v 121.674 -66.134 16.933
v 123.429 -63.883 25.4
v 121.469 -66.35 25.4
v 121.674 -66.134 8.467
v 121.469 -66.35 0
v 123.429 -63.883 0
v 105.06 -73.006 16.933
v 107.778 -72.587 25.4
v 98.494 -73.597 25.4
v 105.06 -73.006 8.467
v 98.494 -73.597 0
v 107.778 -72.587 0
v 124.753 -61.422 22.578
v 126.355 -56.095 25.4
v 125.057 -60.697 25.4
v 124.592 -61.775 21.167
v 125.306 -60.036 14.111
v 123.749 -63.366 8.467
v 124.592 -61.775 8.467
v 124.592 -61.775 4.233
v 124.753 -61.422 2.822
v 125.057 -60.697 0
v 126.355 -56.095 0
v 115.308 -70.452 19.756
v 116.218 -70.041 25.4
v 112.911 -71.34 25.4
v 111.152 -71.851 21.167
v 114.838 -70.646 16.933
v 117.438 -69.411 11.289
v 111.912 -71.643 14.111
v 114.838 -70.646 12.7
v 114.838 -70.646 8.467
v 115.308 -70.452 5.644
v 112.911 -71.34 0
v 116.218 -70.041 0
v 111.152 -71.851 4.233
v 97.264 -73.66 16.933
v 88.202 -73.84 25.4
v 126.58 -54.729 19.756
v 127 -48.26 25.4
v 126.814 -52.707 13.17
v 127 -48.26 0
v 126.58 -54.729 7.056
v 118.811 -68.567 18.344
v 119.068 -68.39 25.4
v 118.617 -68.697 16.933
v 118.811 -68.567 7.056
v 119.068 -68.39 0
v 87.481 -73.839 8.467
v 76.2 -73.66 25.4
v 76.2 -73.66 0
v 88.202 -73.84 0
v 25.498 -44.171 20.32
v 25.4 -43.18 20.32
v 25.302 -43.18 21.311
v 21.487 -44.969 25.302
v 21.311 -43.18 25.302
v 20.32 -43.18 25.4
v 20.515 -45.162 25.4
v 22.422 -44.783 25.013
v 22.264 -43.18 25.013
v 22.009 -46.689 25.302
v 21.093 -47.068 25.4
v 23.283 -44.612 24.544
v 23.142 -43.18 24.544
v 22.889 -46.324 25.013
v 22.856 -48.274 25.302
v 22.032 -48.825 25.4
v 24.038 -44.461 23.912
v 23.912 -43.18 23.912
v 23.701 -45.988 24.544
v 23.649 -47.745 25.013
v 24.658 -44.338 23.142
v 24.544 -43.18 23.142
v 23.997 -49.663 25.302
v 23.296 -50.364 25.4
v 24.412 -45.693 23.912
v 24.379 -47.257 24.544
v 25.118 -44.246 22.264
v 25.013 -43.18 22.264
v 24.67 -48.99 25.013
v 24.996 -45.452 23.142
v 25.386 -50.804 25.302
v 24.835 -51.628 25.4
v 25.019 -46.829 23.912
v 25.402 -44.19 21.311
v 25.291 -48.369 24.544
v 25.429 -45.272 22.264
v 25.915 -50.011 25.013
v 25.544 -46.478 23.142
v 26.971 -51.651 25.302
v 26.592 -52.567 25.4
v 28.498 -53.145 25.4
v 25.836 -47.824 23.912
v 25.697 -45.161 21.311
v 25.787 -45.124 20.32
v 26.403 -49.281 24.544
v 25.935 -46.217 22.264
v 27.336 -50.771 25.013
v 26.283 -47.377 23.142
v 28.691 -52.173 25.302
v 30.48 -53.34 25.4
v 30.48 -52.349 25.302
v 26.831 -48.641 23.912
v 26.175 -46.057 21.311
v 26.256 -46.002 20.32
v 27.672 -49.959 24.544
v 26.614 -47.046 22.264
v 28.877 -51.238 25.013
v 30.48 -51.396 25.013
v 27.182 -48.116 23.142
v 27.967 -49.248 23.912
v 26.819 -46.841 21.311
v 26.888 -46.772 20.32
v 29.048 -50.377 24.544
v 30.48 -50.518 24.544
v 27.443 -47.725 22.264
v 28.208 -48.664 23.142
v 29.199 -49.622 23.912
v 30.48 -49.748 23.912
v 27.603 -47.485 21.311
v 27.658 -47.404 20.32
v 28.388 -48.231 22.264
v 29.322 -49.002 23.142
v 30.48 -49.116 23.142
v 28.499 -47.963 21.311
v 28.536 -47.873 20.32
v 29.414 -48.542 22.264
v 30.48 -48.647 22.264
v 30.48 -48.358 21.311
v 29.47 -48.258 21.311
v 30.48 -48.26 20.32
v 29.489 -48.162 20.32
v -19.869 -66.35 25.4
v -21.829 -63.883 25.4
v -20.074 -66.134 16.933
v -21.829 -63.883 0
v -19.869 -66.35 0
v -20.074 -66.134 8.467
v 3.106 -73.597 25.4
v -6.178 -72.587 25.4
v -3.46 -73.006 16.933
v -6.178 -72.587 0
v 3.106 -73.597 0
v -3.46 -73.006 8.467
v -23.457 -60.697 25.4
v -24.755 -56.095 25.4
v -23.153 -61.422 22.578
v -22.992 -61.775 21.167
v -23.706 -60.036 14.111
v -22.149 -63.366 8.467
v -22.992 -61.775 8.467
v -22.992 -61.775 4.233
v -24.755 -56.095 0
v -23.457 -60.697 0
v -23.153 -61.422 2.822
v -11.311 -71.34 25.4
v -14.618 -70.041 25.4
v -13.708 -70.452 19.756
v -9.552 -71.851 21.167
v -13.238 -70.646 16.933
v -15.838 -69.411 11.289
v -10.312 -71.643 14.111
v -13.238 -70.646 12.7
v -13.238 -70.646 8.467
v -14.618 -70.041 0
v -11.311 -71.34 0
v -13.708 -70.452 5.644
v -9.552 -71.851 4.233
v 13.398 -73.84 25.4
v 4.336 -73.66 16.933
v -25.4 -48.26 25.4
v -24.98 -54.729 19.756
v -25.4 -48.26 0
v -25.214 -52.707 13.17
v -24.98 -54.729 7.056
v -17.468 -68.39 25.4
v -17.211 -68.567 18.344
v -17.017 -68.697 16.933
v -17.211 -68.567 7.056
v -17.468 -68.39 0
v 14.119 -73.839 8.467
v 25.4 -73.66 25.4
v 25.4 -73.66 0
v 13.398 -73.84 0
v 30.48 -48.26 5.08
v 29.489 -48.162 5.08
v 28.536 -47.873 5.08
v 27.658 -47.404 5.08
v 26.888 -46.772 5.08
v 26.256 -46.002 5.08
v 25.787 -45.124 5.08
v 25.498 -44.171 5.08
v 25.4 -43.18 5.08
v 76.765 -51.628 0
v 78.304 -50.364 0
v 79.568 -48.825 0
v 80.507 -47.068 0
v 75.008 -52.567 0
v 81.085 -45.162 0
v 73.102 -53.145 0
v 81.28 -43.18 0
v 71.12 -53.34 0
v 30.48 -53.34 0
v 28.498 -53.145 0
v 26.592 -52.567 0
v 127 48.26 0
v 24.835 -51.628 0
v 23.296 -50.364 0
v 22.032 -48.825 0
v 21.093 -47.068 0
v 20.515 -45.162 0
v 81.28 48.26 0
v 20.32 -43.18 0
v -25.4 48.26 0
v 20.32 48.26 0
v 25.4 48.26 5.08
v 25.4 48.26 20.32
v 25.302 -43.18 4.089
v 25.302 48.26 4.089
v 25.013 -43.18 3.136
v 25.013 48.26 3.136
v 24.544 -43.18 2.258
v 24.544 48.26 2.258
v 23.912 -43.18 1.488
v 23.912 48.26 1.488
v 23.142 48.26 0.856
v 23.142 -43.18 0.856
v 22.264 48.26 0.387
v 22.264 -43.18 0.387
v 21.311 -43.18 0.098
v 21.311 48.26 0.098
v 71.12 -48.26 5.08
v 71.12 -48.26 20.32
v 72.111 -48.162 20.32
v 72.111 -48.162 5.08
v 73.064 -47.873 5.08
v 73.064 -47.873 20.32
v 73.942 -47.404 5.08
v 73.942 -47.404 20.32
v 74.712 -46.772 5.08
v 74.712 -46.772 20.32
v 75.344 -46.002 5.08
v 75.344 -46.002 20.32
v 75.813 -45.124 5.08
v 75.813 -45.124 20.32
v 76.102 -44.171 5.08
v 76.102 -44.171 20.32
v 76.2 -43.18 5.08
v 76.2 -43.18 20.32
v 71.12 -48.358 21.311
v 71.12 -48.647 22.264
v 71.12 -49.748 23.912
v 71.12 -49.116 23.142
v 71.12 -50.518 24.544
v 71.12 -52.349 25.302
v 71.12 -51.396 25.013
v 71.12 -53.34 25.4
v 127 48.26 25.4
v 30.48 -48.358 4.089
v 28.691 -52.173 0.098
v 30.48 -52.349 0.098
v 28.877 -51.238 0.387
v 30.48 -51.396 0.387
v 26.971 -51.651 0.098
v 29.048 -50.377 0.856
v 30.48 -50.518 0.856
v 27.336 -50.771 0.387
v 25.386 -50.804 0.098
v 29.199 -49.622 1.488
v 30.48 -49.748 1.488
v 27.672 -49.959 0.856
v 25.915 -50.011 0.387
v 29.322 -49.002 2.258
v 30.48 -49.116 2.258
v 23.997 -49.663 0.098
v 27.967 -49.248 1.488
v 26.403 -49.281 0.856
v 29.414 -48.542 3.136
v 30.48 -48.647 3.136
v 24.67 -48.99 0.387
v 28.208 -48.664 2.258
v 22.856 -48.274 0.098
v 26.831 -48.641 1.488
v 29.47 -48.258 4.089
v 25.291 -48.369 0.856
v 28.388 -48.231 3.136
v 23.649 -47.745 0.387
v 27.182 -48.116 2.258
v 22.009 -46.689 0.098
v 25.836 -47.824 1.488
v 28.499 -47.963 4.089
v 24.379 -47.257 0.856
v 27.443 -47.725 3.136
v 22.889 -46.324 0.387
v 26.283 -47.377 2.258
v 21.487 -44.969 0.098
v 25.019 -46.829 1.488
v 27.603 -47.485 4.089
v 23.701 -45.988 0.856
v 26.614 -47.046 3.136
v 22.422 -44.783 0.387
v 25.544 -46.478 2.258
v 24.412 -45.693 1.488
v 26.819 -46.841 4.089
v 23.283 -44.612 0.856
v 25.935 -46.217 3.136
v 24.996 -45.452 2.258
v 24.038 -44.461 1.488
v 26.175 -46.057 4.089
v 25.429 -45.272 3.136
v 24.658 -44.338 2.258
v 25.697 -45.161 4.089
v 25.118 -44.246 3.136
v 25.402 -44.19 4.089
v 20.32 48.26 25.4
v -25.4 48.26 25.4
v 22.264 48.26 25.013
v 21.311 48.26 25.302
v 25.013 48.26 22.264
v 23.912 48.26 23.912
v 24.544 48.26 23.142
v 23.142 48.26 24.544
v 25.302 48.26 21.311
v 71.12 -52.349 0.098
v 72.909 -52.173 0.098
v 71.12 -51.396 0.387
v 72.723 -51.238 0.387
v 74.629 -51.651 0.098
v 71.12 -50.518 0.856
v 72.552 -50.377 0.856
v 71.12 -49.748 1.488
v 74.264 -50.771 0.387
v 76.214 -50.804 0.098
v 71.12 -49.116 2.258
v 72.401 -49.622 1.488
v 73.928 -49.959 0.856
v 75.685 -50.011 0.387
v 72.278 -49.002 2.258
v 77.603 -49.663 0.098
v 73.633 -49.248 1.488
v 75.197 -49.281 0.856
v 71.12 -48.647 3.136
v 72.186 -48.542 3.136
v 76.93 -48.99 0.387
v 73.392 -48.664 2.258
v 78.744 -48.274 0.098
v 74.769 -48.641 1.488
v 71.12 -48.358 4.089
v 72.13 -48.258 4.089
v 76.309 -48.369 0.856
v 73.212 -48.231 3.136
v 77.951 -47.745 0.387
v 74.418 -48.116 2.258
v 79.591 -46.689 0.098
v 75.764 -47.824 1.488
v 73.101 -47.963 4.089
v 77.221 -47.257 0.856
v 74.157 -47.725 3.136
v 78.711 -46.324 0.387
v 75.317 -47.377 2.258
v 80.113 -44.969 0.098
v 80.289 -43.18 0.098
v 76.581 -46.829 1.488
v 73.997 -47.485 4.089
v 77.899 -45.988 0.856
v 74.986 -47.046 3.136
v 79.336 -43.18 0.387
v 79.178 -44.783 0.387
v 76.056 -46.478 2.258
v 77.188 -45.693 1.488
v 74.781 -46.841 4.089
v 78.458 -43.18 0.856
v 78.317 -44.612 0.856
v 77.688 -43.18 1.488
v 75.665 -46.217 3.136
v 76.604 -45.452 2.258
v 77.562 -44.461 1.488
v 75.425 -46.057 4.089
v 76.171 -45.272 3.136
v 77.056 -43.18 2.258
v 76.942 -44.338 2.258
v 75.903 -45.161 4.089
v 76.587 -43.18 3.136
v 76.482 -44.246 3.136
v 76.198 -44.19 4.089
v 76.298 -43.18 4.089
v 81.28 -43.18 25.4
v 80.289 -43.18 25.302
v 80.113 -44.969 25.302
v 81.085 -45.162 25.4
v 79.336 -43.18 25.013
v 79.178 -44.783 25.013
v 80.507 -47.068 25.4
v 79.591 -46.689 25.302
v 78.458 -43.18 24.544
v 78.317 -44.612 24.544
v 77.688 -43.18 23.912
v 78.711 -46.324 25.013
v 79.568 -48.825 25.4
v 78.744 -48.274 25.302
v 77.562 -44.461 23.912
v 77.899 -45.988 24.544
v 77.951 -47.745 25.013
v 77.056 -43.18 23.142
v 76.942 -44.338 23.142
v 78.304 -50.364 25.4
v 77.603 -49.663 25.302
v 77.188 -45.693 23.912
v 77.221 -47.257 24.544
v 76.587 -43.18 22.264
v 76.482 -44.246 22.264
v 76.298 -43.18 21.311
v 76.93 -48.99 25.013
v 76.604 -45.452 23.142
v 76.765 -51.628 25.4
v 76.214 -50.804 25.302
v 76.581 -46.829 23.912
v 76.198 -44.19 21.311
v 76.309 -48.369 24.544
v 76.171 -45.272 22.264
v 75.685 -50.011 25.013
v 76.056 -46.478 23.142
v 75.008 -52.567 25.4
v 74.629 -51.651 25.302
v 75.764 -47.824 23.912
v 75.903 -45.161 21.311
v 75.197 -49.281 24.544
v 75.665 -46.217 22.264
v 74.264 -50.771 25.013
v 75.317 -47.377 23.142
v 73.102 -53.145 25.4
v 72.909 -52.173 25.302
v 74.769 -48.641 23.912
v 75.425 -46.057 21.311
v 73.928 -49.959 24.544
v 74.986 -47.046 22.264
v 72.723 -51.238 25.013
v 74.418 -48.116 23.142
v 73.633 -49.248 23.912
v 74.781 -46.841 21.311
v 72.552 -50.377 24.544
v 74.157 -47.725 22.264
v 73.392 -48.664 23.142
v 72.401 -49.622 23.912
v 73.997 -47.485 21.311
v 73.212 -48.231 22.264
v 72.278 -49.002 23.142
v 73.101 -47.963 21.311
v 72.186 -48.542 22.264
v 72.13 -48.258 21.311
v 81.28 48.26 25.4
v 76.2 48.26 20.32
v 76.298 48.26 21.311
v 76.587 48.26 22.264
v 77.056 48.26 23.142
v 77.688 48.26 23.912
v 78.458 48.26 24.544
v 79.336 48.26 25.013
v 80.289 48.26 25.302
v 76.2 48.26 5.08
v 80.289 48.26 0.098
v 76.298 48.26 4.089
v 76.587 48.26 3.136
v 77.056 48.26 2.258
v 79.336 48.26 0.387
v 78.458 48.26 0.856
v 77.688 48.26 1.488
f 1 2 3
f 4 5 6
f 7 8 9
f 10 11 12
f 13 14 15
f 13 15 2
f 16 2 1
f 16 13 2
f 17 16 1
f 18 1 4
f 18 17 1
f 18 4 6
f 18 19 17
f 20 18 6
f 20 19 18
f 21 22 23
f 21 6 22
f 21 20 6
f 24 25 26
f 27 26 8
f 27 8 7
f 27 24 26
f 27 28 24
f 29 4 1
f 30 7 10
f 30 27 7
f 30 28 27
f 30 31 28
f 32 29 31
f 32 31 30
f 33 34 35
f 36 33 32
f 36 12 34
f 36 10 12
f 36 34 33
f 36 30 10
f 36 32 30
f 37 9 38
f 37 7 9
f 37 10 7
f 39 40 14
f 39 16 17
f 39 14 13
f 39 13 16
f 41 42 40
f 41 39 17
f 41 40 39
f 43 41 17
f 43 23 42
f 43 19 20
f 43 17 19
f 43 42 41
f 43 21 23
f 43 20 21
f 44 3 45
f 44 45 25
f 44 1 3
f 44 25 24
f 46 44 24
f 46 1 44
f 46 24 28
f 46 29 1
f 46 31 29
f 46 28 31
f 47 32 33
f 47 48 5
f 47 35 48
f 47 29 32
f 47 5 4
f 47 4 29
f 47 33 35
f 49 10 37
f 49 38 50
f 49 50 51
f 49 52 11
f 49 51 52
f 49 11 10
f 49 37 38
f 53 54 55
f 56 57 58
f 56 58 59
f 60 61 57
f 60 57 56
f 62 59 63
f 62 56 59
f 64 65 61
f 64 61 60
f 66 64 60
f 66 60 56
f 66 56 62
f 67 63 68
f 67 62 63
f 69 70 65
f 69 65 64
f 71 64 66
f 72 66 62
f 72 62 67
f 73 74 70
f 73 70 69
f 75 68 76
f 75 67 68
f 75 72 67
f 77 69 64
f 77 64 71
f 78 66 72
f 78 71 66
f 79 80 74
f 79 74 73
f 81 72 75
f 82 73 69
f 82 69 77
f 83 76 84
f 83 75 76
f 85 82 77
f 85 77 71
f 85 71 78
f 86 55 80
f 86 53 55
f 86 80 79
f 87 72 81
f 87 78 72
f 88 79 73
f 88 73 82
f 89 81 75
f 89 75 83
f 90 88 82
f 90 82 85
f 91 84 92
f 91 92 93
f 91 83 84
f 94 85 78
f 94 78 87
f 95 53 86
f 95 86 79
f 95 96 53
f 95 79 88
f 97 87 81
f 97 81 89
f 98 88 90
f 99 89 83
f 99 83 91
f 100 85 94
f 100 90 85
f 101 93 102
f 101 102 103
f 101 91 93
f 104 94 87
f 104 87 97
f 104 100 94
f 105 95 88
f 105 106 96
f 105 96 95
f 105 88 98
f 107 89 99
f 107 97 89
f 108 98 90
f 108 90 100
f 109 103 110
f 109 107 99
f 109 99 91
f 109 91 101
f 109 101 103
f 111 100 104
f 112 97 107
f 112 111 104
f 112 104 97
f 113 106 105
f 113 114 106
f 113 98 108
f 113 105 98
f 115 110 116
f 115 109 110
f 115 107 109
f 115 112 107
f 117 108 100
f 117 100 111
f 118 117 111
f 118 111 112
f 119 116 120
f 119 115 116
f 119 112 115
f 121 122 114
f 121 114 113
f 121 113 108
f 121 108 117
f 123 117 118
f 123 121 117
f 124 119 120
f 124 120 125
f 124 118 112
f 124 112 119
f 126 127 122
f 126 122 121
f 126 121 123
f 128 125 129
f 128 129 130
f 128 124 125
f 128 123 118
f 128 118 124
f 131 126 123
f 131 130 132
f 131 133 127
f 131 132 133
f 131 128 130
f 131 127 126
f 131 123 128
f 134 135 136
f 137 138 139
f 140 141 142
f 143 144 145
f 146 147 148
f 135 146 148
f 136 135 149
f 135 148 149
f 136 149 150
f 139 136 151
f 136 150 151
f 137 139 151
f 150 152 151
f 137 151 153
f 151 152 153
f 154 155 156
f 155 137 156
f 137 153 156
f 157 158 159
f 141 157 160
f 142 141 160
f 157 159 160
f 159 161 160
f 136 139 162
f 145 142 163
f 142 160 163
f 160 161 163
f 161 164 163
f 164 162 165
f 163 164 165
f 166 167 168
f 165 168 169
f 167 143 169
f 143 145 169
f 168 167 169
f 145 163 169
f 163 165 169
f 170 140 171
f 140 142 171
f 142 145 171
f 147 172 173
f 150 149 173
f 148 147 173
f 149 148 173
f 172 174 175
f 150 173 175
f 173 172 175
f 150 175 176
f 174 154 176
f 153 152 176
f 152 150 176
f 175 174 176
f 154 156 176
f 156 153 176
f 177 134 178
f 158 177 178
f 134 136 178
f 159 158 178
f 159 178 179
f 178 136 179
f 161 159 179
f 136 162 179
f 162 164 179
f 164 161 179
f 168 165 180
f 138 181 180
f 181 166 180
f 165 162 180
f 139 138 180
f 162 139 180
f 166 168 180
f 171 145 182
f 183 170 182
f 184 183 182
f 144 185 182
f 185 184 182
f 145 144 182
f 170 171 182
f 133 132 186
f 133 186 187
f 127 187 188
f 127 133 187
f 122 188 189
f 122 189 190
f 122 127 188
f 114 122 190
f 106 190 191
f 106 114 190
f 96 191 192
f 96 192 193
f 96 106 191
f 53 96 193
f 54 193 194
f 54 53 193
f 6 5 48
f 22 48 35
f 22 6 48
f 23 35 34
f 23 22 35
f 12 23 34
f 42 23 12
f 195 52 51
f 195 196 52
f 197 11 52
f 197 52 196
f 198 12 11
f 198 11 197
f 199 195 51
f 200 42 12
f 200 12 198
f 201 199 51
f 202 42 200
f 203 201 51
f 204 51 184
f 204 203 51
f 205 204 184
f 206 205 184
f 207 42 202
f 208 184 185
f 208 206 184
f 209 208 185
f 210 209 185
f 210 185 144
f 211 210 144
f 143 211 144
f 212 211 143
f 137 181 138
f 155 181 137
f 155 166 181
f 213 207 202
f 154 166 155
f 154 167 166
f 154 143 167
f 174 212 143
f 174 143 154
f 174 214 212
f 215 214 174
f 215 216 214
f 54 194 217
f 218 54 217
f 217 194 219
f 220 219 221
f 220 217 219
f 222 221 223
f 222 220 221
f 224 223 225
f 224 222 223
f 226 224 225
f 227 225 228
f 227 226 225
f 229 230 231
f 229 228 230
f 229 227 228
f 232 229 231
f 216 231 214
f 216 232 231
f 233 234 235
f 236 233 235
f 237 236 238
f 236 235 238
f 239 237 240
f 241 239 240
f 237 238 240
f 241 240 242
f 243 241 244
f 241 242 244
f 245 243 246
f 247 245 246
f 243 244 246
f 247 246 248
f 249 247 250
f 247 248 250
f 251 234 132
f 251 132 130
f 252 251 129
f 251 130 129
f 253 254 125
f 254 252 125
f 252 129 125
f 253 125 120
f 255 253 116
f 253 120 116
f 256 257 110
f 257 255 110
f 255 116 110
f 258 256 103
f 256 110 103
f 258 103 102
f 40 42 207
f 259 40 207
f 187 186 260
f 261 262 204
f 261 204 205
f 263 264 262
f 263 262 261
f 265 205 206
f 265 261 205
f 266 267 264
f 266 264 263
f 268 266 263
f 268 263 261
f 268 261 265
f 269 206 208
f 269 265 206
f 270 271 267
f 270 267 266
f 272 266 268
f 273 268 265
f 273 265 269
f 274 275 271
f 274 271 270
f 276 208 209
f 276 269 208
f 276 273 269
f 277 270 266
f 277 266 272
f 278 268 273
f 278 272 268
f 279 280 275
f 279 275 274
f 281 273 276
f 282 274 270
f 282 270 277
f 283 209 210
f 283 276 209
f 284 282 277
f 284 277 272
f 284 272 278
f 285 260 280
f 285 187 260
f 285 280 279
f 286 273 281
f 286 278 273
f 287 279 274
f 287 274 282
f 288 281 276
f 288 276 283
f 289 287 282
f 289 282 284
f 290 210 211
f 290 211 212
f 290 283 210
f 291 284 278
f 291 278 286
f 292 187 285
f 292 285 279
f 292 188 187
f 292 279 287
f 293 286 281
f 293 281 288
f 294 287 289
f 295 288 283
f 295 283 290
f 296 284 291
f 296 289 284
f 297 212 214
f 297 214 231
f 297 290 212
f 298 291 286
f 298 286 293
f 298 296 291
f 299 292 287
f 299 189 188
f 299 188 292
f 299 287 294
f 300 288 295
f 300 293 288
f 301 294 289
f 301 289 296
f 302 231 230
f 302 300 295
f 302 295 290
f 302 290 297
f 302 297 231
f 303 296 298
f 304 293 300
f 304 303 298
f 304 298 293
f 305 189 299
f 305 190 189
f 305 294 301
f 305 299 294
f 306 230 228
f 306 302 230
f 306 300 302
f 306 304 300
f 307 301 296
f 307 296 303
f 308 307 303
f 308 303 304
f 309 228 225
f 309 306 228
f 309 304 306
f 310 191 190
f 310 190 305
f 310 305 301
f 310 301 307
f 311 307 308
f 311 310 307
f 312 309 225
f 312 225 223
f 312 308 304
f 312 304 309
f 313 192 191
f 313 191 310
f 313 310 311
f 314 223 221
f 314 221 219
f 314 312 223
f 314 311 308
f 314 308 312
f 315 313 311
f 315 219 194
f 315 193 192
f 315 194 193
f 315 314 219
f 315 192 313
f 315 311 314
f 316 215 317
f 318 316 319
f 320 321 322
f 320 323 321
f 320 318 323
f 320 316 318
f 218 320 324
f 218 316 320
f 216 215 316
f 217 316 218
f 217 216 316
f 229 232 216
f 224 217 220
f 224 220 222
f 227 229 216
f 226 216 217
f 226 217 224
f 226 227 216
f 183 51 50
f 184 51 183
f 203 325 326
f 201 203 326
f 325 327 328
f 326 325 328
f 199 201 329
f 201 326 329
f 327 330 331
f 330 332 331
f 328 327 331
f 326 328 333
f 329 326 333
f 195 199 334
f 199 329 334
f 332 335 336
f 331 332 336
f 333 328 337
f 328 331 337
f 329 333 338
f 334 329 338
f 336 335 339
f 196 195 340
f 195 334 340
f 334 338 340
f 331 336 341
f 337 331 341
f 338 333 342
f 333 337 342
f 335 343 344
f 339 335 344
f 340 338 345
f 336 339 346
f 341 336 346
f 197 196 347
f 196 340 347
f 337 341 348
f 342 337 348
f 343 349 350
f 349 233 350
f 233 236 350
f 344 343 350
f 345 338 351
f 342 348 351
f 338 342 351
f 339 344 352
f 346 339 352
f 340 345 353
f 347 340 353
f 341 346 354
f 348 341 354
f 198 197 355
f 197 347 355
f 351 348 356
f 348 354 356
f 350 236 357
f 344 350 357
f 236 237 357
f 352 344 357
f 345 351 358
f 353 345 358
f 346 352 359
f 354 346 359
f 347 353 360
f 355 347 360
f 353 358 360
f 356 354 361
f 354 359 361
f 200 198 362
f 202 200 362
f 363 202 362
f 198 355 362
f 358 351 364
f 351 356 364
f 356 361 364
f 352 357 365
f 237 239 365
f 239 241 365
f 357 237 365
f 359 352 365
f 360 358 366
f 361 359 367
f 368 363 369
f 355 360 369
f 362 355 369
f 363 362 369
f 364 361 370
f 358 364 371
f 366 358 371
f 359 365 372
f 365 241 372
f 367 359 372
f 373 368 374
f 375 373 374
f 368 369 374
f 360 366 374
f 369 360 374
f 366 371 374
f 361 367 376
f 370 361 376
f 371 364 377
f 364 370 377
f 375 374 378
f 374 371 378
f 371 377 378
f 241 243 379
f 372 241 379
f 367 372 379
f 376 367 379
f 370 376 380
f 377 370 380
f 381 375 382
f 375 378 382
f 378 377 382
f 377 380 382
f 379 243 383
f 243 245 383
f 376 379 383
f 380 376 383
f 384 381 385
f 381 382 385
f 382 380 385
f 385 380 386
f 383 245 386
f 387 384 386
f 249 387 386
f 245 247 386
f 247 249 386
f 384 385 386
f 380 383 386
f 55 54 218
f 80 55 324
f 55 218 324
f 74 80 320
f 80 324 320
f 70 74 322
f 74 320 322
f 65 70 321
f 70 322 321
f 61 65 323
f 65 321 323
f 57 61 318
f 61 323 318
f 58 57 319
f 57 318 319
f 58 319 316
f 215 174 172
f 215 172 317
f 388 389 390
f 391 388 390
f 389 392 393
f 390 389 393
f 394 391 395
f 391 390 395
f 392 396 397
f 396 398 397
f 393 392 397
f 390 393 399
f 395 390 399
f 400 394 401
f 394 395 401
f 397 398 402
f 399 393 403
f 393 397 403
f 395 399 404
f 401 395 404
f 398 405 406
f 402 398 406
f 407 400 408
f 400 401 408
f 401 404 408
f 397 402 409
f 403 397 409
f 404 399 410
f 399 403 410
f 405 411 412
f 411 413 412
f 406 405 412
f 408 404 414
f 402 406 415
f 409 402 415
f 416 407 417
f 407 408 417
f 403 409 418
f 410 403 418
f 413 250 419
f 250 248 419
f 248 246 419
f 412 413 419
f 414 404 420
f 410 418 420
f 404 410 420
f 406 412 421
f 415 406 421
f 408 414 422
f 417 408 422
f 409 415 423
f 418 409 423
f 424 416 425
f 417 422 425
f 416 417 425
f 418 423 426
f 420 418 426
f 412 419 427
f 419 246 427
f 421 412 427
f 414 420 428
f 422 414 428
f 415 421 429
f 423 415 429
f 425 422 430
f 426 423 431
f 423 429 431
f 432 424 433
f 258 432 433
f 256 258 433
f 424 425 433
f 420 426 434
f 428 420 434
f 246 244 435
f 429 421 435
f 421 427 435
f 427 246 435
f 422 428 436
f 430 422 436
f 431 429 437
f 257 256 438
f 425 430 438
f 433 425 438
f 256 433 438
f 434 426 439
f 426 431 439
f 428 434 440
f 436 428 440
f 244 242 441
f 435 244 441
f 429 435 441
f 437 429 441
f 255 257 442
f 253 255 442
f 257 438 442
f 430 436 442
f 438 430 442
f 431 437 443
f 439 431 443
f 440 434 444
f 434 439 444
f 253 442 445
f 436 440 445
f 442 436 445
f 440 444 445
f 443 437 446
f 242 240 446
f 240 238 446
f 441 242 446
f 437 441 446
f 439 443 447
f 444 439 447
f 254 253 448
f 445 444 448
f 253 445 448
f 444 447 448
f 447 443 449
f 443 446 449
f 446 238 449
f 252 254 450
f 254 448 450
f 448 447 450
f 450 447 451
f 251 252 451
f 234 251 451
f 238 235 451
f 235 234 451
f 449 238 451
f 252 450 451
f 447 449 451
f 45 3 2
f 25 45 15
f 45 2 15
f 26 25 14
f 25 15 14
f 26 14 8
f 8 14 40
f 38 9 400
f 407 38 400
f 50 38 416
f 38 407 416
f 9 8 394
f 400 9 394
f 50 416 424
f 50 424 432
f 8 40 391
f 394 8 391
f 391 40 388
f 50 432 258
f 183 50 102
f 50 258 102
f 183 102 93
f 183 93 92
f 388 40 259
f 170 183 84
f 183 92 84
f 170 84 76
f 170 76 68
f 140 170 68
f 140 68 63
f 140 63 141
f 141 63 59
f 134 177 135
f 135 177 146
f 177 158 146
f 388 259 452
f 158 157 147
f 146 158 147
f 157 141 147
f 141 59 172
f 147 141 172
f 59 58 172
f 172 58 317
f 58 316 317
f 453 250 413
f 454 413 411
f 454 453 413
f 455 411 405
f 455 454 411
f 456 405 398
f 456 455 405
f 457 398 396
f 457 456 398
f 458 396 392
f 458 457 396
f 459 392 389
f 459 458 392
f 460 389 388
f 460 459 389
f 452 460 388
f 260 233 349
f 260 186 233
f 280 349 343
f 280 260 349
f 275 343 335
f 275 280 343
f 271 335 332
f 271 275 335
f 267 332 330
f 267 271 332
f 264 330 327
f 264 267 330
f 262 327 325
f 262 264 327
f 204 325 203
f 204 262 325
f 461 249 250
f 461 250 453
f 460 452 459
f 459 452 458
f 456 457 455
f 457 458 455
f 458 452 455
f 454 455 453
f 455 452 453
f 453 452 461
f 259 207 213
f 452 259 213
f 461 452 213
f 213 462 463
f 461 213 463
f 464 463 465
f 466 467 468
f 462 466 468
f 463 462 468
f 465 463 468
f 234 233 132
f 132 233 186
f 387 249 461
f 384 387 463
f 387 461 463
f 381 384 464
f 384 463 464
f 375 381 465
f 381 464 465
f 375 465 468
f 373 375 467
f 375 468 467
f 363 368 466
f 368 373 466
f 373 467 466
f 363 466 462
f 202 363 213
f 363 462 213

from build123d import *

# Parameters (mm, degrees)
F0_W     = 50.8
F0_H     = 96.52
F0_W_2   = 25.4
F0_H_2   = 25.4
F1_DEPTH = 25.4
F2_R     = 5.08


with BuildPart() as f1:
    # F0 (on Top) → F1 (new body)
    with BuildSketch(Plane.XY):
        Rectangle(F0_W, F0_H)
        with BuildLine():
            Line((25.4, -48.26), (-25.4, -48.26))
            add(Edge.make_bspline(
                [(-25.4, -48.26), (-25.400003, -73.229496), (-9.901697, -74.52103), (25.4, -73.66)],
                knots=[0, 0, 0, 0, 56.796127, 56.796127, 56.796127, 56.796127], degree=3))
            Line((25.4, -73.66), (25.4, -48.26))
        make_face()
        with Locations((38.1, -60.96)):
            Rectangle(F0_W_2, F0_H_2)
    extrude(amount=F1_DEPTH)

    # F2
    f2_edges = [f1.edges().sort_by_distance(p)[0] for p in [
        (25.4, 0, 25.4),
        (38.1, -48.26, 25.4),
        (38.1, -48.26, 0),
        (25.4, 0, 0),
        (25.4, -48.26, 12.7),
    ]]
    fillet(f2_edges, radius=F2_R)

    # F3: F1 across face


with BuildPart() as f1_1:
    add(f1.part)
    add(f1.part.mirror(Plane(origin=(50.8, -61.162023, 12.7), x_dir=(0, 1, 0), z_dir=(1, 0, 0))))


solid = f1_1.part
